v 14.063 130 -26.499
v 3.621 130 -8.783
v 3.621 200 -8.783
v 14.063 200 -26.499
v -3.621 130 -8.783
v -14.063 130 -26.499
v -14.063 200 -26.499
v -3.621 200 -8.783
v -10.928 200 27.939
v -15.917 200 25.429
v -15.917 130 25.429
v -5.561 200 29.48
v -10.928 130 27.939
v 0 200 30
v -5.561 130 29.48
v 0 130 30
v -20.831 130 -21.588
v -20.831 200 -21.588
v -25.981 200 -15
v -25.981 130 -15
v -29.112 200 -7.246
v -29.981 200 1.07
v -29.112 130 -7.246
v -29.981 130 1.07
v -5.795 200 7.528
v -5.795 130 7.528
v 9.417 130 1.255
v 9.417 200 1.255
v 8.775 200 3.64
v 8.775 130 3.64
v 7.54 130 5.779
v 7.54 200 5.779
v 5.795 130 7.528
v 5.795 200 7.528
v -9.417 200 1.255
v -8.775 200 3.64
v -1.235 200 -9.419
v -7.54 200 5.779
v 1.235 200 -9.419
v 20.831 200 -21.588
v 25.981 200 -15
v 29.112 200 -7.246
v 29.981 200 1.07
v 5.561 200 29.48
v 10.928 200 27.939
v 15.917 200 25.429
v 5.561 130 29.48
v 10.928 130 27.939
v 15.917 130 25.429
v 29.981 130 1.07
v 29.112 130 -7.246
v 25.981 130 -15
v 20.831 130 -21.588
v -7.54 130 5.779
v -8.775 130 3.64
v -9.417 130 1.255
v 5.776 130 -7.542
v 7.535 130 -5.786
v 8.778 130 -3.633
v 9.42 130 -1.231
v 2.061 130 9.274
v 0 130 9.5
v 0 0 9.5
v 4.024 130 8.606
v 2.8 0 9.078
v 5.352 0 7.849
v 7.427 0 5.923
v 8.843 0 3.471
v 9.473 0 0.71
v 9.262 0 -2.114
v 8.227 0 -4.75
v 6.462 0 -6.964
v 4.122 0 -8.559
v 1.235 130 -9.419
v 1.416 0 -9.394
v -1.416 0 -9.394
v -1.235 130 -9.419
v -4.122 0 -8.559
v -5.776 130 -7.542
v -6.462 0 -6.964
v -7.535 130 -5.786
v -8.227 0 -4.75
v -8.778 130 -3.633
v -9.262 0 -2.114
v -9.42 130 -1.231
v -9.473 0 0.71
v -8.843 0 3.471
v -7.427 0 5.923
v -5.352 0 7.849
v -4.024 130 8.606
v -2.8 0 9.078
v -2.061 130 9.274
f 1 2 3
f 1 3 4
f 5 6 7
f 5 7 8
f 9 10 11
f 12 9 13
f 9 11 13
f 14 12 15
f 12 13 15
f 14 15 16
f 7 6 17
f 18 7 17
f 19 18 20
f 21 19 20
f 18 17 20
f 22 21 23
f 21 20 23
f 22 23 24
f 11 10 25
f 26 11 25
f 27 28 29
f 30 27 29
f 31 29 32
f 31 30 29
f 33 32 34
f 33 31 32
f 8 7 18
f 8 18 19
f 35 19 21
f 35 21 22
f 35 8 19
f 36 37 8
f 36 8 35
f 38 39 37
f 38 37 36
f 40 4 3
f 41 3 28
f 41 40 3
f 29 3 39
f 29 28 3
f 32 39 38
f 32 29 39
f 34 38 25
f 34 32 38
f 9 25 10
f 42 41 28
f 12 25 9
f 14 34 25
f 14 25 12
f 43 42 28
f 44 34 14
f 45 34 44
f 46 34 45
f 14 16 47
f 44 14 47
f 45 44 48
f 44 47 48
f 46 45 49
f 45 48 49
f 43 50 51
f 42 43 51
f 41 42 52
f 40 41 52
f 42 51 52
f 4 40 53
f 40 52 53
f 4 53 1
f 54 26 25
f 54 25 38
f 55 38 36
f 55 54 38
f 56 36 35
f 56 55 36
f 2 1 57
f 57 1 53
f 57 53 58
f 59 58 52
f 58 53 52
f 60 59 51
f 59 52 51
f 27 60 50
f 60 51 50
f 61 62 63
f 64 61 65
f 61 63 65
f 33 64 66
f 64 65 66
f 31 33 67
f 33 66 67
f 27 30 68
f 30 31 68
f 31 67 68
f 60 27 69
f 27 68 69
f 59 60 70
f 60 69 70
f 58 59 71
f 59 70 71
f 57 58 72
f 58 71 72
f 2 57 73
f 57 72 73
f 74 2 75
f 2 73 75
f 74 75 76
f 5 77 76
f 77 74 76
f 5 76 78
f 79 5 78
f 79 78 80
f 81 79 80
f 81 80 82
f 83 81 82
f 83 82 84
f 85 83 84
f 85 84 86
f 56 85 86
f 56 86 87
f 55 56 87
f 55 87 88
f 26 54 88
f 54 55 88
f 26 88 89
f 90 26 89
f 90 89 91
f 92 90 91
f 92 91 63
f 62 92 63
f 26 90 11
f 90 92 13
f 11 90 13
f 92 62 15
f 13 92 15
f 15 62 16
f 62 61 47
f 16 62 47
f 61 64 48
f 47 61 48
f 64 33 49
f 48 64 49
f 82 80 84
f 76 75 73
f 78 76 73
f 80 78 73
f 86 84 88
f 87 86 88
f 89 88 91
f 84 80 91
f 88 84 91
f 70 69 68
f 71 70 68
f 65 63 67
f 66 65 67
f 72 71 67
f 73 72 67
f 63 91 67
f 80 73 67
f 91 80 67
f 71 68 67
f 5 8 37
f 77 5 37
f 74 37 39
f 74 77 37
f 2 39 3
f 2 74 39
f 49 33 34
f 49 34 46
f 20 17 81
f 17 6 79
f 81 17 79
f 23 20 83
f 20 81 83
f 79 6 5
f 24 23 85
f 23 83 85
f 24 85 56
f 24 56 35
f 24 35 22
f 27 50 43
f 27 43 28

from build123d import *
from build123d.topology import SkipClean

# Parameters (mm, degrees)
SKETCH1_R           = 9.5
BOSS_EXTRUDE1_DEPTH = 200
BOSS_EXTRUDE2_START = -70
SKETCH2_R           = 30
SKETCH2_R_2         = 9.5
BOSS_EXTRUDE2_DEPTH = 70
CUT_EXTRUDE1_DEPTH  = 137.747943312
CIRPATTERN1_COUNT   = 3


with BuildPart() as part:
    # Sketch1 → Boss-Extrude1 (new body)
    with BuildSketch(Plane(origin=(0, 0, 0), x_dir=(1, 0, 0), z_dir=(0, 1, 0))):
        with Locations(Location((0, 0, 0), (0, 0, 270))):
            Circle(SKETCH1_R)
    extrude(amount=BOSS_EXTRUDE1_DEPTH)

    # Sketch2 → Boss-Extrude2 (add)
    with BuildSketch(Plane(origin=(0, 200, 0), x_dir=(1, 0, 0), z_dir=(0, 1, 0)).offset(BOSS_EXTRUDE2_START)):
        with Locations(Location((0, 0, 0), (0, 0, 270))):
            Circle(SKETCH2_R)
        with Locations(Location((0, 0, 0), (0, 0, 270))):
            Circle(SKETCH2_R_2, mode=Mode.SUBTRACT)
    extrude(amount=BOSS_EXTRUDE2_DEPTH)

    # Sketch3 → Cut-Extrude1 (cut, through all)
    with SkipClean():  # the faces are left unmerged after this step: merging them gives an invalid solid
        with BuildSketch(Plane.XZ.offset(-130)):
            with BuildLine():
                Line((20.805356407, -37.93850618), (-20.805356407, -37.93850618))
                Line((-20.805356407, -37.93850618), (-3.621476876, -8.782647963))
                ThreePointArc((-3.621476876, -8.782647963), (0, -9.5), (3.621476876, -8.782647963))
                Line((3.621476876, -8.782647963), (20.805356407, -37.93850618))
            make_face()
        cut_extrude1 = extrude(amount=-CUT_EXTRUDE1_DEPTH, mode=Mode.SUBTRACT)

    # CirPattern1: Cut-Extrude1 ×3 about axis
    with SkipClean():  # the faces are left unmerged after this step: merging them gives an invalid solid
        cirpattern1_axis = Axis((0, 0, 0), (0, 1, 0))
        for i in range(1, CIRPATTERN1_COUNT):
            add(cut_extrude1.rotate(cirpattern1_axis, i * 360 / CIRPATTERN1_COUNT), mode=Mode.SUBTRACT)


solid = part.part
